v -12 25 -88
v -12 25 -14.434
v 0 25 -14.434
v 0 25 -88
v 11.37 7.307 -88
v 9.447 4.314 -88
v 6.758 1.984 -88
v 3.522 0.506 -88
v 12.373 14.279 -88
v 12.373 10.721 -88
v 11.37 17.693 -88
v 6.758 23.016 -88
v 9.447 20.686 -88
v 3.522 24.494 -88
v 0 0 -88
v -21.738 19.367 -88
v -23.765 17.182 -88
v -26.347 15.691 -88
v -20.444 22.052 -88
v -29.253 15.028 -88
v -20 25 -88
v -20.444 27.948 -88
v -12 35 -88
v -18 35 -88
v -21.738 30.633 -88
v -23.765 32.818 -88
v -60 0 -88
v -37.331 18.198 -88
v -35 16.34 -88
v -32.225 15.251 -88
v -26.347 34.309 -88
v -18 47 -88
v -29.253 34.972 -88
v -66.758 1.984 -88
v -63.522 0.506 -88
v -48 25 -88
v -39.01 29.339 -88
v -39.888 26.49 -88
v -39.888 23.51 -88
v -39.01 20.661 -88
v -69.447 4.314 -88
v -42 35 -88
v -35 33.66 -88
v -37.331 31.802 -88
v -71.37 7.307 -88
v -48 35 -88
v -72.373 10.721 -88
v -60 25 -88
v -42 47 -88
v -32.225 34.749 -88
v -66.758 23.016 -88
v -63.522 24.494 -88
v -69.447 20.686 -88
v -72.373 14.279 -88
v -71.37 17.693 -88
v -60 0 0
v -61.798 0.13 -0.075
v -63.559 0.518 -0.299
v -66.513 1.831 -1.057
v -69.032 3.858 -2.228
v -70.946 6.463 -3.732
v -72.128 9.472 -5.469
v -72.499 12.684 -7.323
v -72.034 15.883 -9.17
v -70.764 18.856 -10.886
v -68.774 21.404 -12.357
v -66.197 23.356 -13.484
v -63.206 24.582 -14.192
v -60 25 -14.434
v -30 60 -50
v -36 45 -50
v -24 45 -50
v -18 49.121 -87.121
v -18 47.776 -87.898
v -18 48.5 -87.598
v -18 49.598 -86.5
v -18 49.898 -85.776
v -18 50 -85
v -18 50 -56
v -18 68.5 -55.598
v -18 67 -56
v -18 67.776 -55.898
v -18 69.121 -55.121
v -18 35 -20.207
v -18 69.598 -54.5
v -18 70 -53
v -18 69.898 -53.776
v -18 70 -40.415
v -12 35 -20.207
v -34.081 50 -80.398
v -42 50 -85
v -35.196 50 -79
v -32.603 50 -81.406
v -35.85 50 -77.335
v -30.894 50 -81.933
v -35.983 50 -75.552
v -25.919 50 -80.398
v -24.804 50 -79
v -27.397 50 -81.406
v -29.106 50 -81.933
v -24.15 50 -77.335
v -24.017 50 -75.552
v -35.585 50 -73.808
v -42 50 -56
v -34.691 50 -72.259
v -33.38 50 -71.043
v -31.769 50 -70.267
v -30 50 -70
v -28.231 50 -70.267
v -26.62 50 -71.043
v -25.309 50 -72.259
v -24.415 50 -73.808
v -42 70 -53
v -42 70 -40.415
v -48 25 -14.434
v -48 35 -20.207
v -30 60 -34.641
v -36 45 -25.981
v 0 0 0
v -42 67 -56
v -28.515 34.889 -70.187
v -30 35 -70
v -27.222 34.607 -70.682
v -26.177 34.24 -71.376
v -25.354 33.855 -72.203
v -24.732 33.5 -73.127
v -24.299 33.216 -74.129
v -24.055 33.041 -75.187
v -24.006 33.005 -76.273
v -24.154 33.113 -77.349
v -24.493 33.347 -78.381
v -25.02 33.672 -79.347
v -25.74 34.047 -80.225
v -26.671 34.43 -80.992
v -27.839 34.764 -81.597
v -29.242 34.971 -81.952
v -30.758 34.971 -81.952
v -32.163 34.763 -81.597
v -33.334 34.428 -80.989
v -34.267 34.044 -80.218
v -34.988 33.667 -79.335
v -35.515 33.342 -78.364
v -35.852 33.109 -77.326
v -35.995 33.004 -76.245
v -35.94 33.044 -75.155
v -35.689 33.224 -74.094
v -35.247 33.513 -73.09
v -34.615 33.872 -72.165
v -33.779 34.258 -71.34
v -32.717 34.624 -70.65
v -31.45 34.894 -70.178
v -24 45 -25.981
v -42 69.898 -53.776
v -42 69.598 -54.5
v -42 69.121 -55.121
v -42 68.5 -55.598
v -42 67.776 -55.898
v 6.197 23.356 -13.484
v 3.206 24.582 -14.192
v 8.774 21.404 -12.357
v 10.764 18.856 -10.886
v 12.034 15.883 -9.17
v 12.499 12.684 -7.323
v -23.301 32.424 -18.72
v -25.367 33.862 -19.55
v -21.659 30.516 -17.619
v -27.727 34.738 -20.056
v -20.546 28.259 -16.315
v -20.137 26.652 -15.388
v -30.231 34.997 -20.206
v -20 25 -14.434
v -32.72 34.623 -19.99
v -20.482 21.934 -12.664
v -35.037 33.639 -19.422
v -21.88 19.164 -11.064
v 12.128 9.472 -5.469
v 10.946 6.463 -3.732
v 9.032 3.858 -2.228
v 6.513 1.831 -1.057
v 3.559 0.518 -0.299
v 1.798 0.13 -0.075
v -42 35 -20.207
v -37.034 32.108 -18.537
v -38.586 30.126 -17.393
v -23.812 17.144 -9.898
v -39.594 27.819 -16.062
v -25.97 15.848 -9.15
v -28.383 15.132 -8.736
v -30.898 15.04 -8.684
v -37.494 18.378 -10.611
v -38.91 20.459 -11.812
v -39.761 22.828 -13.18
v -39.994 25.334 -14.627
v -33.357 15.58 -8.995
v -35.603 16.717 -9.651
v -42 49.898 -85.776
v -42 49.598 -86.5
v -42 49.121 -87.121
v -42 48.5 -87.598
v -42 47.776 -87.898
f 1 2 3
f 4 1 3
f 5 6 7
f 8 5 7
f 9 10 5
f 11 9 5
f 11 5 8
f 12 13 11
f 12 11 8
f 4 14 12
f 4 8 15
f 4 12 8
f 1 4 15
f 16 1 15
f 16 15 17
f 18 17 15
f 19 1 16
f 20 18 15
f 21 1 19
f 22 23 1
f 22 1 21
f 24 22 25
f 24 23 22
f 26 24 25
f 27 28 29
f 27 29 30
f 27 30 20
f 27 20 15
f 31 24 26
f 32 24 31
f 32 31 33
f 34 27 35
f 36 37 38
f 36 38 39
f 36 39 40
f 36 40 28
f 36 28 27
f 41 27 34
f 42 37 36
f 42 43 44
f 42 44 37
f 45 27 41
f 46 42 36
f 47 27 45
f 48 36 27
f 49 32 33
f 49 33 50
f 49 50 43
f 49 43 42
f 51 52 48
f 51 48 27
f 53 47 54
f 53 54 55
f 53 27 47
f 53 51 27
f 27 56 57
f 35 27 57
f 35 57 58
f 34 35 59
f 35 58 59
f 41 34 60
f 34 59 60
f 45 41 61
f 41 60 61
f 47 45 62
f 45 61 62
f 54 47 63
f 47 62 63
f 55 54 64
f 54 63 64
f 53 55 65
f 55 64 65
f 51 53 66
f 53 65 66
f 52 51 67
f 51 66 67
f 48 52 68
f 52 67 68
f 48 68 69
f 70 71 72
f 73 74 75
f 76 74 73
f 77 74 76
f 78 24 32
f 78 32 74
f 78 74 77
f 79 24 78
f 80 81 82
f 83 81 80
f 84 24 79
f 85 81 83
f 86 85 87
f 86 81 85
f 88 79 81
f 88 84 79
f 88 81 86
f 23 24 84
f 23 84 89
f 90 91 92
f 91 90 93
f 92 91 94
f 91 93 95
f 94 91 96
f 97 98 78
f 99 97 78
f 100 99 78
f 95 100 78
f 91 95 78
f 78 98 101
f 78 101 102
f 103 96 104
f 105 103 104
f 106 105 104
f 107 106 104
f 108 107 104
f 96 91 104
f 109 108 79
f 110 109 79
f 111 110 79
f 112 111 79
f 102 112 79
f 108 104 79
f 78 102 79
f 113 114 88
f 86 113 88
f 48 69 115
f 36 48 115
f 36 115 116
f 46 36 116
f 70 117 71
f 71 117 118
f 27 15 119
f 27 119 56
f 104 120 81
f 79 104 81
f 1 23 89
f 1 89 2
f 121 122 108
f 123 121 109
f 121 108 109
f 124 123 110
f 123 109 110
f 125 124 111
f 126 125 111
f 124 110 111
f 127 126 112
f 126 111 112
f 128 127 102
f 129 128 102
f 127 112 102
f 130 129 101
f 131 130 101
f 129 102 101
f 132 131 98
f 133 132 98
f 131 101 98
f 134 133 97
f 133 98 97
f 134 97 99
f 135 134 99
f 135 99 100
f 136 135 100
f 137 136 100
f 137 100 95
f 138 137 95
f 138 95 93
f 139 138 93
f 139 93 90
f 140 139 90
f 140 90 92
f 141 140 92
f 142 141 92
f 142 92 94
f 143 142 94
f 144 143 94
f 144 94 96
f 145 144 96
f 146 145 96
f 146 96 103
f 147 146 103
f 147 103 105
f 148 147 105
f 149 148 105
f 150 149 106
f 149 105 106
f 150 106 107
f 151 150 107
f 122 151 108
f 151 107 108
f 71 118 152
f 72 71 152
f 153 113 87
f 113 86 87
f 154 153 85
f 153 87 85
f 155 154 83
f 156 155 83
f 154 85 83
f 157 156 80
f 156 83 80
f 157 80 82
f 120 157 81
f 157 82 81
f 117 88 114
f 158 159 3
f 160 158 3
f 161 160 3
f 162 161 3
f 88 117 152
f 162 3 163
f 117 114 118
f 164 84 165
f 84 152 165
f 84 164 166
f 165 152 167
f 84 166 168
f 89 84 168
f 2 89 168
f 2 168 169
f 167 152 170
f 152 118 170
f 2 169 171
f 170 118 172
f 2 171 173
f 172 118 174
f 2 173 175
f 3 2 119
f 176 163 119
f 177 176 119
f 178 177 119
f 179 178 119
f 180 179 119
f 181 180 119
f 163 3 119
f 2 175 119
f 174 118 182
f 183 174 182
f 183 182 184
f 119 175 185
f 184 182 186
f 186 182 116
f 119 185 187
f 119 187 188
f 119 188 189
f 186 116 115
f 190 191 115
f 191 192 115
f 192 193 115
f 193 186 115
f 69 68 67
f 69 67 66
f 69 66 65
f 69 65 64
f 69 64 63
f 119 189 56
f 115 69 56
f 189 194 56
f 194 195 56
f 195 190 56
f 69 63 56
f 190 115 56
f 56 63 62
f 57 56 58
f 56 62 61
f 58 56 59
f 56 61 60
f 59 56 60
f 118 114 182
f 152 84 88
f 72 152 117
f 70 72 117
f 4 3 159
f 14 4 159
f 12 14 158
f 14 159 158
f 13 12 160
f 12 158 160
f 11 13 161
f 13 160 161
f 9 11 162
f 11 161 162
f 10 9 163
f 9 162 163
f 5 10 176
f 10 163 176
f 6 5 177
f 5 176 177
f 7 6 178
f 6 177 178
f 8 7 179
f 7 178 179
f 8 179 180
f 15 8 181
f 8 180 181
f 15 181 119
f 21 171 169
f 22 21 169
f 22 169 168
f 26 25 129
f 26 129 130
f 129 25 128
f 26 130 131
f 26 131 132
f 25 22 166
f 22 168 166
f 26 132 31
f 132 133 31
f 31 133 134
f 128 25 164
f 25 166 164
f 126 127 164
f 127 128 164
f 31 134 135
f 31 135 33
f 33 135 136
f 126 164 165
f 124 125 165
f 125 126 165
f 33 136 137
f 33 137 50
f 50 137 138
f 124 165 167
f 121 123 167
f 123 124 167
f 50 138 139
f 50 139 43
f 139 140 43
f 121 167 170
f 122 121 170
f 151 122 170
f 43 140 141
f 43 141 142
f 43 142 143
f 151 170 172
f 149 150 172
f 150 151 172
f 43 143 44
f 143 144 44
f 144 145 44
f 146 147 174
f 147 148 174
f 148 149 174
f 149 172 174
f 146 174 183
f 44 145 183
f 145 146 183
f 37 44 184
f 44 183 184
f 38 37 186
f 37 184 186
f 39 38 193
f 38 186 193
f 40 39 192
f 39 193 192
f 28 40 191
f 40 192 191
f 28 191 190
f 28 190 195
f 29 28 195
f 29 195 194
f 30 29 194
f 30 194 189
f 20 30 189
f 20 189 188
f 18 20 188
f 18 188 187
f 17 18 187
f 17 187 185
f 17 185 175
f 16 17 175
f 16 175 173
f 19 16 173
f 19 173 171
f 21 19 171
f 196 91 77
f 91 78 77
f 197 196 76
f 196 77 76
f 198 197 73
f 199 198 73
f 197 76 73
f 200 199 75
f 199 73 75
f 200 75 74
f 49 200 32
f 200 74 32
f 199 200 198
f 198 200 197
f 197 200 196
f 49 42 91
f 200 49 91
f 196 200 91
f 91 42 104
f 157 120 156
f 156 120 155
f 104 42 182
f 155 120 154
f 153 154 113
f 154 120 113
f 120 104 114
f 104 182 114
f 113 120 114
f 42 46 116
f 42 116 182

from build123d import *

# Parameters (mm, degrees)
ESBO_O1_R                         = 10
RESSALTO_EXTRUS_O1_DEPTH          = 88
ESBO_O1_6_W                       = 24
ESBO_O1_6_H                       = 20
RESSALTO_EXTRUS_O2_DEPTH          = 56
CORTE_EXTRUS_O1_REACH             = 126.957
CORTE_EXTRUS_O1_DIRECTION_2_REACH = 126.957
CORTE_EXTRUS_O2_DEPTH             = 50
CORTE_EXTRUS_O6_REACH             = 126.5
CORTE_EXTRUS_O6_END_RADIUS        = 10
ESBO_O3_R                         = 6
FILETE1_R                         = 3
FILETE2_R                         = 3


with BuildPart() as part:
    # Esboço1 → Ressalto-extrusão1 (new body)
    with BuildSketch(Plane.XY):
        with BuildLine():
            Line((-60, 25), (-48, 25))
            Line((-48, 25), (-48, 35))
            Line((-48, 35), (-42, 35))
            Line((-42, 35), (-42, 50))
            Line((-42, 50), (-18, 50))
            Line((-18, 50), (-18, 35))
            Line((-18, 35), (-12, 35))
            Line((-12, 35), (-12, 25))
            Line((-12, 25), (0, 25))
            ThreePointArc((0, 25), (12.5, 12.5), (0, 0))
            Line((0, 0), (-60, 0))
            ThreePointArc((-60, 0), (-72.5, 12.5), (-60, 25))
        make_face()
        with Locations((-30, 25)):
            Circle(ESBO_O1_R, mode=Mode.SUBTRACT)
    extrude(amount=-RESSALTO_EXTRUS_O1_DEPTH)

    # Esboço1<6> → Ressalto-extrusão2 (add)
    with BuildSketch(Plane.XY):
        with Locations((-30, 60)):
            Rectangle(ESBO_O1_6_W, ESBO_O1_6_H)
    extrude(amount=-RESSALTO_EXTRUS_O2_DEPTH)

    # Esboço2 → Corte-extrusão1 (cut, up to next)
    with BuildSketch(Plane.ZY.offset(42), mode=Mode.PRIVATE) as corte_extrus_o1_sk1:
        Polygon((-40.414518843, 70), (0, 0), (0, 70), align=None)
    corte_extrus_o1_tool1 = extrude(corte_extrus_o1_sk1.sketch, amount=-CORTE_EXTRUS_O1_REACH, mode=Mode.PRIVATE) & part.part
    add(corte_extrus_o1_tool1.solids().sort_by_distance((-42, 46.666667, -13.471506))[0], mode=Mode.SUBTRACT)

    # Esboço2 → Corte-extrusão1 direction 2 (cut, up to next)
    with BuildSketch(Plane.ZY.offset(42), mode=Mode.PRIVATE) as corte_extrus_o1_direction_2_sk1:
        Polygon((-40.414518843, 70), (0, 0), (0, 70), align=None)
    corte_extrus_o1_direction_2_tool1 = extrude(corte_extrus_o1_direction_2_sk1.sketch, amount=CORTE_EXTRUS_O1_DIRECTION_2_REACH, mode=Mode.PRIVATE) & part.part
    add(corte_extrus_o1_direction_2_tool1.solids().sort_by_distance((-42, 46.666667, -13.471506))[0], mode=Mode.SUBTRACT)

    # Esboço1<8> → Corte-extrusão2 (cut)
    with BuildSketch(Plane.XY):
        Polygon((-36, 45), (-24, 45), (-30, 60), align=None)
    extrude(amount=-CORTE_EXTRUS_O2_DEPTH, mode=Mode.SUBTRACT)

    # Corte-extrusão6: up to this cylinder (the profile starts outside it)
    corte_extrus_o6_end = Plane(origin=(-30, 25, -76), z_dir=(0, 0, 1)) * Cylinder(CORTE_EXTRUS_O6_END_RADIUS, 274, mode=Mode.PRIVATE)
    # Esboço3 → Corte-extrusão6 (cut, up to the surface)
    with BuildSketch(Plane(origin=(0, 50, 0), x_dir=(1, 0, 0), z_dir=(0, 1, 0)), mode=Mode.PRIVATE) as corte_extrus_o6_sk1:
        with Locations(Location((-30, 76, 0), (0, 0, 270))):
            Circle(ESBO_O3_R)
    corte_extrus_o6_tool1 = extrude(corte_extrus_o6_sk1.sketch, amount=-CORTE_EXTRUS_O6_REACH, mode=Mode.PRIVATE) - corte_extrus_o6_end
    add(corte_extrus_o6_tool1.solids().sort_by_distance((-30, 50, -76))[0], mode=Mode.SUBTRACT)

    # Filete1
    filete1_edges = [part.edges().sort_by_distance(p)[0] for p in [
        (-30, 70, -56),
    ]]
    fillet(filete1_edges, radius=FILETE1_R)

    # Filete2
    filete2_edges = [part.edges().sort_by_distance(p)[0] for p in [
        (-30, 50, -88),
    ]]
    fillet(filete2_edges, radius=FILETE2_R)


solid = part.part
